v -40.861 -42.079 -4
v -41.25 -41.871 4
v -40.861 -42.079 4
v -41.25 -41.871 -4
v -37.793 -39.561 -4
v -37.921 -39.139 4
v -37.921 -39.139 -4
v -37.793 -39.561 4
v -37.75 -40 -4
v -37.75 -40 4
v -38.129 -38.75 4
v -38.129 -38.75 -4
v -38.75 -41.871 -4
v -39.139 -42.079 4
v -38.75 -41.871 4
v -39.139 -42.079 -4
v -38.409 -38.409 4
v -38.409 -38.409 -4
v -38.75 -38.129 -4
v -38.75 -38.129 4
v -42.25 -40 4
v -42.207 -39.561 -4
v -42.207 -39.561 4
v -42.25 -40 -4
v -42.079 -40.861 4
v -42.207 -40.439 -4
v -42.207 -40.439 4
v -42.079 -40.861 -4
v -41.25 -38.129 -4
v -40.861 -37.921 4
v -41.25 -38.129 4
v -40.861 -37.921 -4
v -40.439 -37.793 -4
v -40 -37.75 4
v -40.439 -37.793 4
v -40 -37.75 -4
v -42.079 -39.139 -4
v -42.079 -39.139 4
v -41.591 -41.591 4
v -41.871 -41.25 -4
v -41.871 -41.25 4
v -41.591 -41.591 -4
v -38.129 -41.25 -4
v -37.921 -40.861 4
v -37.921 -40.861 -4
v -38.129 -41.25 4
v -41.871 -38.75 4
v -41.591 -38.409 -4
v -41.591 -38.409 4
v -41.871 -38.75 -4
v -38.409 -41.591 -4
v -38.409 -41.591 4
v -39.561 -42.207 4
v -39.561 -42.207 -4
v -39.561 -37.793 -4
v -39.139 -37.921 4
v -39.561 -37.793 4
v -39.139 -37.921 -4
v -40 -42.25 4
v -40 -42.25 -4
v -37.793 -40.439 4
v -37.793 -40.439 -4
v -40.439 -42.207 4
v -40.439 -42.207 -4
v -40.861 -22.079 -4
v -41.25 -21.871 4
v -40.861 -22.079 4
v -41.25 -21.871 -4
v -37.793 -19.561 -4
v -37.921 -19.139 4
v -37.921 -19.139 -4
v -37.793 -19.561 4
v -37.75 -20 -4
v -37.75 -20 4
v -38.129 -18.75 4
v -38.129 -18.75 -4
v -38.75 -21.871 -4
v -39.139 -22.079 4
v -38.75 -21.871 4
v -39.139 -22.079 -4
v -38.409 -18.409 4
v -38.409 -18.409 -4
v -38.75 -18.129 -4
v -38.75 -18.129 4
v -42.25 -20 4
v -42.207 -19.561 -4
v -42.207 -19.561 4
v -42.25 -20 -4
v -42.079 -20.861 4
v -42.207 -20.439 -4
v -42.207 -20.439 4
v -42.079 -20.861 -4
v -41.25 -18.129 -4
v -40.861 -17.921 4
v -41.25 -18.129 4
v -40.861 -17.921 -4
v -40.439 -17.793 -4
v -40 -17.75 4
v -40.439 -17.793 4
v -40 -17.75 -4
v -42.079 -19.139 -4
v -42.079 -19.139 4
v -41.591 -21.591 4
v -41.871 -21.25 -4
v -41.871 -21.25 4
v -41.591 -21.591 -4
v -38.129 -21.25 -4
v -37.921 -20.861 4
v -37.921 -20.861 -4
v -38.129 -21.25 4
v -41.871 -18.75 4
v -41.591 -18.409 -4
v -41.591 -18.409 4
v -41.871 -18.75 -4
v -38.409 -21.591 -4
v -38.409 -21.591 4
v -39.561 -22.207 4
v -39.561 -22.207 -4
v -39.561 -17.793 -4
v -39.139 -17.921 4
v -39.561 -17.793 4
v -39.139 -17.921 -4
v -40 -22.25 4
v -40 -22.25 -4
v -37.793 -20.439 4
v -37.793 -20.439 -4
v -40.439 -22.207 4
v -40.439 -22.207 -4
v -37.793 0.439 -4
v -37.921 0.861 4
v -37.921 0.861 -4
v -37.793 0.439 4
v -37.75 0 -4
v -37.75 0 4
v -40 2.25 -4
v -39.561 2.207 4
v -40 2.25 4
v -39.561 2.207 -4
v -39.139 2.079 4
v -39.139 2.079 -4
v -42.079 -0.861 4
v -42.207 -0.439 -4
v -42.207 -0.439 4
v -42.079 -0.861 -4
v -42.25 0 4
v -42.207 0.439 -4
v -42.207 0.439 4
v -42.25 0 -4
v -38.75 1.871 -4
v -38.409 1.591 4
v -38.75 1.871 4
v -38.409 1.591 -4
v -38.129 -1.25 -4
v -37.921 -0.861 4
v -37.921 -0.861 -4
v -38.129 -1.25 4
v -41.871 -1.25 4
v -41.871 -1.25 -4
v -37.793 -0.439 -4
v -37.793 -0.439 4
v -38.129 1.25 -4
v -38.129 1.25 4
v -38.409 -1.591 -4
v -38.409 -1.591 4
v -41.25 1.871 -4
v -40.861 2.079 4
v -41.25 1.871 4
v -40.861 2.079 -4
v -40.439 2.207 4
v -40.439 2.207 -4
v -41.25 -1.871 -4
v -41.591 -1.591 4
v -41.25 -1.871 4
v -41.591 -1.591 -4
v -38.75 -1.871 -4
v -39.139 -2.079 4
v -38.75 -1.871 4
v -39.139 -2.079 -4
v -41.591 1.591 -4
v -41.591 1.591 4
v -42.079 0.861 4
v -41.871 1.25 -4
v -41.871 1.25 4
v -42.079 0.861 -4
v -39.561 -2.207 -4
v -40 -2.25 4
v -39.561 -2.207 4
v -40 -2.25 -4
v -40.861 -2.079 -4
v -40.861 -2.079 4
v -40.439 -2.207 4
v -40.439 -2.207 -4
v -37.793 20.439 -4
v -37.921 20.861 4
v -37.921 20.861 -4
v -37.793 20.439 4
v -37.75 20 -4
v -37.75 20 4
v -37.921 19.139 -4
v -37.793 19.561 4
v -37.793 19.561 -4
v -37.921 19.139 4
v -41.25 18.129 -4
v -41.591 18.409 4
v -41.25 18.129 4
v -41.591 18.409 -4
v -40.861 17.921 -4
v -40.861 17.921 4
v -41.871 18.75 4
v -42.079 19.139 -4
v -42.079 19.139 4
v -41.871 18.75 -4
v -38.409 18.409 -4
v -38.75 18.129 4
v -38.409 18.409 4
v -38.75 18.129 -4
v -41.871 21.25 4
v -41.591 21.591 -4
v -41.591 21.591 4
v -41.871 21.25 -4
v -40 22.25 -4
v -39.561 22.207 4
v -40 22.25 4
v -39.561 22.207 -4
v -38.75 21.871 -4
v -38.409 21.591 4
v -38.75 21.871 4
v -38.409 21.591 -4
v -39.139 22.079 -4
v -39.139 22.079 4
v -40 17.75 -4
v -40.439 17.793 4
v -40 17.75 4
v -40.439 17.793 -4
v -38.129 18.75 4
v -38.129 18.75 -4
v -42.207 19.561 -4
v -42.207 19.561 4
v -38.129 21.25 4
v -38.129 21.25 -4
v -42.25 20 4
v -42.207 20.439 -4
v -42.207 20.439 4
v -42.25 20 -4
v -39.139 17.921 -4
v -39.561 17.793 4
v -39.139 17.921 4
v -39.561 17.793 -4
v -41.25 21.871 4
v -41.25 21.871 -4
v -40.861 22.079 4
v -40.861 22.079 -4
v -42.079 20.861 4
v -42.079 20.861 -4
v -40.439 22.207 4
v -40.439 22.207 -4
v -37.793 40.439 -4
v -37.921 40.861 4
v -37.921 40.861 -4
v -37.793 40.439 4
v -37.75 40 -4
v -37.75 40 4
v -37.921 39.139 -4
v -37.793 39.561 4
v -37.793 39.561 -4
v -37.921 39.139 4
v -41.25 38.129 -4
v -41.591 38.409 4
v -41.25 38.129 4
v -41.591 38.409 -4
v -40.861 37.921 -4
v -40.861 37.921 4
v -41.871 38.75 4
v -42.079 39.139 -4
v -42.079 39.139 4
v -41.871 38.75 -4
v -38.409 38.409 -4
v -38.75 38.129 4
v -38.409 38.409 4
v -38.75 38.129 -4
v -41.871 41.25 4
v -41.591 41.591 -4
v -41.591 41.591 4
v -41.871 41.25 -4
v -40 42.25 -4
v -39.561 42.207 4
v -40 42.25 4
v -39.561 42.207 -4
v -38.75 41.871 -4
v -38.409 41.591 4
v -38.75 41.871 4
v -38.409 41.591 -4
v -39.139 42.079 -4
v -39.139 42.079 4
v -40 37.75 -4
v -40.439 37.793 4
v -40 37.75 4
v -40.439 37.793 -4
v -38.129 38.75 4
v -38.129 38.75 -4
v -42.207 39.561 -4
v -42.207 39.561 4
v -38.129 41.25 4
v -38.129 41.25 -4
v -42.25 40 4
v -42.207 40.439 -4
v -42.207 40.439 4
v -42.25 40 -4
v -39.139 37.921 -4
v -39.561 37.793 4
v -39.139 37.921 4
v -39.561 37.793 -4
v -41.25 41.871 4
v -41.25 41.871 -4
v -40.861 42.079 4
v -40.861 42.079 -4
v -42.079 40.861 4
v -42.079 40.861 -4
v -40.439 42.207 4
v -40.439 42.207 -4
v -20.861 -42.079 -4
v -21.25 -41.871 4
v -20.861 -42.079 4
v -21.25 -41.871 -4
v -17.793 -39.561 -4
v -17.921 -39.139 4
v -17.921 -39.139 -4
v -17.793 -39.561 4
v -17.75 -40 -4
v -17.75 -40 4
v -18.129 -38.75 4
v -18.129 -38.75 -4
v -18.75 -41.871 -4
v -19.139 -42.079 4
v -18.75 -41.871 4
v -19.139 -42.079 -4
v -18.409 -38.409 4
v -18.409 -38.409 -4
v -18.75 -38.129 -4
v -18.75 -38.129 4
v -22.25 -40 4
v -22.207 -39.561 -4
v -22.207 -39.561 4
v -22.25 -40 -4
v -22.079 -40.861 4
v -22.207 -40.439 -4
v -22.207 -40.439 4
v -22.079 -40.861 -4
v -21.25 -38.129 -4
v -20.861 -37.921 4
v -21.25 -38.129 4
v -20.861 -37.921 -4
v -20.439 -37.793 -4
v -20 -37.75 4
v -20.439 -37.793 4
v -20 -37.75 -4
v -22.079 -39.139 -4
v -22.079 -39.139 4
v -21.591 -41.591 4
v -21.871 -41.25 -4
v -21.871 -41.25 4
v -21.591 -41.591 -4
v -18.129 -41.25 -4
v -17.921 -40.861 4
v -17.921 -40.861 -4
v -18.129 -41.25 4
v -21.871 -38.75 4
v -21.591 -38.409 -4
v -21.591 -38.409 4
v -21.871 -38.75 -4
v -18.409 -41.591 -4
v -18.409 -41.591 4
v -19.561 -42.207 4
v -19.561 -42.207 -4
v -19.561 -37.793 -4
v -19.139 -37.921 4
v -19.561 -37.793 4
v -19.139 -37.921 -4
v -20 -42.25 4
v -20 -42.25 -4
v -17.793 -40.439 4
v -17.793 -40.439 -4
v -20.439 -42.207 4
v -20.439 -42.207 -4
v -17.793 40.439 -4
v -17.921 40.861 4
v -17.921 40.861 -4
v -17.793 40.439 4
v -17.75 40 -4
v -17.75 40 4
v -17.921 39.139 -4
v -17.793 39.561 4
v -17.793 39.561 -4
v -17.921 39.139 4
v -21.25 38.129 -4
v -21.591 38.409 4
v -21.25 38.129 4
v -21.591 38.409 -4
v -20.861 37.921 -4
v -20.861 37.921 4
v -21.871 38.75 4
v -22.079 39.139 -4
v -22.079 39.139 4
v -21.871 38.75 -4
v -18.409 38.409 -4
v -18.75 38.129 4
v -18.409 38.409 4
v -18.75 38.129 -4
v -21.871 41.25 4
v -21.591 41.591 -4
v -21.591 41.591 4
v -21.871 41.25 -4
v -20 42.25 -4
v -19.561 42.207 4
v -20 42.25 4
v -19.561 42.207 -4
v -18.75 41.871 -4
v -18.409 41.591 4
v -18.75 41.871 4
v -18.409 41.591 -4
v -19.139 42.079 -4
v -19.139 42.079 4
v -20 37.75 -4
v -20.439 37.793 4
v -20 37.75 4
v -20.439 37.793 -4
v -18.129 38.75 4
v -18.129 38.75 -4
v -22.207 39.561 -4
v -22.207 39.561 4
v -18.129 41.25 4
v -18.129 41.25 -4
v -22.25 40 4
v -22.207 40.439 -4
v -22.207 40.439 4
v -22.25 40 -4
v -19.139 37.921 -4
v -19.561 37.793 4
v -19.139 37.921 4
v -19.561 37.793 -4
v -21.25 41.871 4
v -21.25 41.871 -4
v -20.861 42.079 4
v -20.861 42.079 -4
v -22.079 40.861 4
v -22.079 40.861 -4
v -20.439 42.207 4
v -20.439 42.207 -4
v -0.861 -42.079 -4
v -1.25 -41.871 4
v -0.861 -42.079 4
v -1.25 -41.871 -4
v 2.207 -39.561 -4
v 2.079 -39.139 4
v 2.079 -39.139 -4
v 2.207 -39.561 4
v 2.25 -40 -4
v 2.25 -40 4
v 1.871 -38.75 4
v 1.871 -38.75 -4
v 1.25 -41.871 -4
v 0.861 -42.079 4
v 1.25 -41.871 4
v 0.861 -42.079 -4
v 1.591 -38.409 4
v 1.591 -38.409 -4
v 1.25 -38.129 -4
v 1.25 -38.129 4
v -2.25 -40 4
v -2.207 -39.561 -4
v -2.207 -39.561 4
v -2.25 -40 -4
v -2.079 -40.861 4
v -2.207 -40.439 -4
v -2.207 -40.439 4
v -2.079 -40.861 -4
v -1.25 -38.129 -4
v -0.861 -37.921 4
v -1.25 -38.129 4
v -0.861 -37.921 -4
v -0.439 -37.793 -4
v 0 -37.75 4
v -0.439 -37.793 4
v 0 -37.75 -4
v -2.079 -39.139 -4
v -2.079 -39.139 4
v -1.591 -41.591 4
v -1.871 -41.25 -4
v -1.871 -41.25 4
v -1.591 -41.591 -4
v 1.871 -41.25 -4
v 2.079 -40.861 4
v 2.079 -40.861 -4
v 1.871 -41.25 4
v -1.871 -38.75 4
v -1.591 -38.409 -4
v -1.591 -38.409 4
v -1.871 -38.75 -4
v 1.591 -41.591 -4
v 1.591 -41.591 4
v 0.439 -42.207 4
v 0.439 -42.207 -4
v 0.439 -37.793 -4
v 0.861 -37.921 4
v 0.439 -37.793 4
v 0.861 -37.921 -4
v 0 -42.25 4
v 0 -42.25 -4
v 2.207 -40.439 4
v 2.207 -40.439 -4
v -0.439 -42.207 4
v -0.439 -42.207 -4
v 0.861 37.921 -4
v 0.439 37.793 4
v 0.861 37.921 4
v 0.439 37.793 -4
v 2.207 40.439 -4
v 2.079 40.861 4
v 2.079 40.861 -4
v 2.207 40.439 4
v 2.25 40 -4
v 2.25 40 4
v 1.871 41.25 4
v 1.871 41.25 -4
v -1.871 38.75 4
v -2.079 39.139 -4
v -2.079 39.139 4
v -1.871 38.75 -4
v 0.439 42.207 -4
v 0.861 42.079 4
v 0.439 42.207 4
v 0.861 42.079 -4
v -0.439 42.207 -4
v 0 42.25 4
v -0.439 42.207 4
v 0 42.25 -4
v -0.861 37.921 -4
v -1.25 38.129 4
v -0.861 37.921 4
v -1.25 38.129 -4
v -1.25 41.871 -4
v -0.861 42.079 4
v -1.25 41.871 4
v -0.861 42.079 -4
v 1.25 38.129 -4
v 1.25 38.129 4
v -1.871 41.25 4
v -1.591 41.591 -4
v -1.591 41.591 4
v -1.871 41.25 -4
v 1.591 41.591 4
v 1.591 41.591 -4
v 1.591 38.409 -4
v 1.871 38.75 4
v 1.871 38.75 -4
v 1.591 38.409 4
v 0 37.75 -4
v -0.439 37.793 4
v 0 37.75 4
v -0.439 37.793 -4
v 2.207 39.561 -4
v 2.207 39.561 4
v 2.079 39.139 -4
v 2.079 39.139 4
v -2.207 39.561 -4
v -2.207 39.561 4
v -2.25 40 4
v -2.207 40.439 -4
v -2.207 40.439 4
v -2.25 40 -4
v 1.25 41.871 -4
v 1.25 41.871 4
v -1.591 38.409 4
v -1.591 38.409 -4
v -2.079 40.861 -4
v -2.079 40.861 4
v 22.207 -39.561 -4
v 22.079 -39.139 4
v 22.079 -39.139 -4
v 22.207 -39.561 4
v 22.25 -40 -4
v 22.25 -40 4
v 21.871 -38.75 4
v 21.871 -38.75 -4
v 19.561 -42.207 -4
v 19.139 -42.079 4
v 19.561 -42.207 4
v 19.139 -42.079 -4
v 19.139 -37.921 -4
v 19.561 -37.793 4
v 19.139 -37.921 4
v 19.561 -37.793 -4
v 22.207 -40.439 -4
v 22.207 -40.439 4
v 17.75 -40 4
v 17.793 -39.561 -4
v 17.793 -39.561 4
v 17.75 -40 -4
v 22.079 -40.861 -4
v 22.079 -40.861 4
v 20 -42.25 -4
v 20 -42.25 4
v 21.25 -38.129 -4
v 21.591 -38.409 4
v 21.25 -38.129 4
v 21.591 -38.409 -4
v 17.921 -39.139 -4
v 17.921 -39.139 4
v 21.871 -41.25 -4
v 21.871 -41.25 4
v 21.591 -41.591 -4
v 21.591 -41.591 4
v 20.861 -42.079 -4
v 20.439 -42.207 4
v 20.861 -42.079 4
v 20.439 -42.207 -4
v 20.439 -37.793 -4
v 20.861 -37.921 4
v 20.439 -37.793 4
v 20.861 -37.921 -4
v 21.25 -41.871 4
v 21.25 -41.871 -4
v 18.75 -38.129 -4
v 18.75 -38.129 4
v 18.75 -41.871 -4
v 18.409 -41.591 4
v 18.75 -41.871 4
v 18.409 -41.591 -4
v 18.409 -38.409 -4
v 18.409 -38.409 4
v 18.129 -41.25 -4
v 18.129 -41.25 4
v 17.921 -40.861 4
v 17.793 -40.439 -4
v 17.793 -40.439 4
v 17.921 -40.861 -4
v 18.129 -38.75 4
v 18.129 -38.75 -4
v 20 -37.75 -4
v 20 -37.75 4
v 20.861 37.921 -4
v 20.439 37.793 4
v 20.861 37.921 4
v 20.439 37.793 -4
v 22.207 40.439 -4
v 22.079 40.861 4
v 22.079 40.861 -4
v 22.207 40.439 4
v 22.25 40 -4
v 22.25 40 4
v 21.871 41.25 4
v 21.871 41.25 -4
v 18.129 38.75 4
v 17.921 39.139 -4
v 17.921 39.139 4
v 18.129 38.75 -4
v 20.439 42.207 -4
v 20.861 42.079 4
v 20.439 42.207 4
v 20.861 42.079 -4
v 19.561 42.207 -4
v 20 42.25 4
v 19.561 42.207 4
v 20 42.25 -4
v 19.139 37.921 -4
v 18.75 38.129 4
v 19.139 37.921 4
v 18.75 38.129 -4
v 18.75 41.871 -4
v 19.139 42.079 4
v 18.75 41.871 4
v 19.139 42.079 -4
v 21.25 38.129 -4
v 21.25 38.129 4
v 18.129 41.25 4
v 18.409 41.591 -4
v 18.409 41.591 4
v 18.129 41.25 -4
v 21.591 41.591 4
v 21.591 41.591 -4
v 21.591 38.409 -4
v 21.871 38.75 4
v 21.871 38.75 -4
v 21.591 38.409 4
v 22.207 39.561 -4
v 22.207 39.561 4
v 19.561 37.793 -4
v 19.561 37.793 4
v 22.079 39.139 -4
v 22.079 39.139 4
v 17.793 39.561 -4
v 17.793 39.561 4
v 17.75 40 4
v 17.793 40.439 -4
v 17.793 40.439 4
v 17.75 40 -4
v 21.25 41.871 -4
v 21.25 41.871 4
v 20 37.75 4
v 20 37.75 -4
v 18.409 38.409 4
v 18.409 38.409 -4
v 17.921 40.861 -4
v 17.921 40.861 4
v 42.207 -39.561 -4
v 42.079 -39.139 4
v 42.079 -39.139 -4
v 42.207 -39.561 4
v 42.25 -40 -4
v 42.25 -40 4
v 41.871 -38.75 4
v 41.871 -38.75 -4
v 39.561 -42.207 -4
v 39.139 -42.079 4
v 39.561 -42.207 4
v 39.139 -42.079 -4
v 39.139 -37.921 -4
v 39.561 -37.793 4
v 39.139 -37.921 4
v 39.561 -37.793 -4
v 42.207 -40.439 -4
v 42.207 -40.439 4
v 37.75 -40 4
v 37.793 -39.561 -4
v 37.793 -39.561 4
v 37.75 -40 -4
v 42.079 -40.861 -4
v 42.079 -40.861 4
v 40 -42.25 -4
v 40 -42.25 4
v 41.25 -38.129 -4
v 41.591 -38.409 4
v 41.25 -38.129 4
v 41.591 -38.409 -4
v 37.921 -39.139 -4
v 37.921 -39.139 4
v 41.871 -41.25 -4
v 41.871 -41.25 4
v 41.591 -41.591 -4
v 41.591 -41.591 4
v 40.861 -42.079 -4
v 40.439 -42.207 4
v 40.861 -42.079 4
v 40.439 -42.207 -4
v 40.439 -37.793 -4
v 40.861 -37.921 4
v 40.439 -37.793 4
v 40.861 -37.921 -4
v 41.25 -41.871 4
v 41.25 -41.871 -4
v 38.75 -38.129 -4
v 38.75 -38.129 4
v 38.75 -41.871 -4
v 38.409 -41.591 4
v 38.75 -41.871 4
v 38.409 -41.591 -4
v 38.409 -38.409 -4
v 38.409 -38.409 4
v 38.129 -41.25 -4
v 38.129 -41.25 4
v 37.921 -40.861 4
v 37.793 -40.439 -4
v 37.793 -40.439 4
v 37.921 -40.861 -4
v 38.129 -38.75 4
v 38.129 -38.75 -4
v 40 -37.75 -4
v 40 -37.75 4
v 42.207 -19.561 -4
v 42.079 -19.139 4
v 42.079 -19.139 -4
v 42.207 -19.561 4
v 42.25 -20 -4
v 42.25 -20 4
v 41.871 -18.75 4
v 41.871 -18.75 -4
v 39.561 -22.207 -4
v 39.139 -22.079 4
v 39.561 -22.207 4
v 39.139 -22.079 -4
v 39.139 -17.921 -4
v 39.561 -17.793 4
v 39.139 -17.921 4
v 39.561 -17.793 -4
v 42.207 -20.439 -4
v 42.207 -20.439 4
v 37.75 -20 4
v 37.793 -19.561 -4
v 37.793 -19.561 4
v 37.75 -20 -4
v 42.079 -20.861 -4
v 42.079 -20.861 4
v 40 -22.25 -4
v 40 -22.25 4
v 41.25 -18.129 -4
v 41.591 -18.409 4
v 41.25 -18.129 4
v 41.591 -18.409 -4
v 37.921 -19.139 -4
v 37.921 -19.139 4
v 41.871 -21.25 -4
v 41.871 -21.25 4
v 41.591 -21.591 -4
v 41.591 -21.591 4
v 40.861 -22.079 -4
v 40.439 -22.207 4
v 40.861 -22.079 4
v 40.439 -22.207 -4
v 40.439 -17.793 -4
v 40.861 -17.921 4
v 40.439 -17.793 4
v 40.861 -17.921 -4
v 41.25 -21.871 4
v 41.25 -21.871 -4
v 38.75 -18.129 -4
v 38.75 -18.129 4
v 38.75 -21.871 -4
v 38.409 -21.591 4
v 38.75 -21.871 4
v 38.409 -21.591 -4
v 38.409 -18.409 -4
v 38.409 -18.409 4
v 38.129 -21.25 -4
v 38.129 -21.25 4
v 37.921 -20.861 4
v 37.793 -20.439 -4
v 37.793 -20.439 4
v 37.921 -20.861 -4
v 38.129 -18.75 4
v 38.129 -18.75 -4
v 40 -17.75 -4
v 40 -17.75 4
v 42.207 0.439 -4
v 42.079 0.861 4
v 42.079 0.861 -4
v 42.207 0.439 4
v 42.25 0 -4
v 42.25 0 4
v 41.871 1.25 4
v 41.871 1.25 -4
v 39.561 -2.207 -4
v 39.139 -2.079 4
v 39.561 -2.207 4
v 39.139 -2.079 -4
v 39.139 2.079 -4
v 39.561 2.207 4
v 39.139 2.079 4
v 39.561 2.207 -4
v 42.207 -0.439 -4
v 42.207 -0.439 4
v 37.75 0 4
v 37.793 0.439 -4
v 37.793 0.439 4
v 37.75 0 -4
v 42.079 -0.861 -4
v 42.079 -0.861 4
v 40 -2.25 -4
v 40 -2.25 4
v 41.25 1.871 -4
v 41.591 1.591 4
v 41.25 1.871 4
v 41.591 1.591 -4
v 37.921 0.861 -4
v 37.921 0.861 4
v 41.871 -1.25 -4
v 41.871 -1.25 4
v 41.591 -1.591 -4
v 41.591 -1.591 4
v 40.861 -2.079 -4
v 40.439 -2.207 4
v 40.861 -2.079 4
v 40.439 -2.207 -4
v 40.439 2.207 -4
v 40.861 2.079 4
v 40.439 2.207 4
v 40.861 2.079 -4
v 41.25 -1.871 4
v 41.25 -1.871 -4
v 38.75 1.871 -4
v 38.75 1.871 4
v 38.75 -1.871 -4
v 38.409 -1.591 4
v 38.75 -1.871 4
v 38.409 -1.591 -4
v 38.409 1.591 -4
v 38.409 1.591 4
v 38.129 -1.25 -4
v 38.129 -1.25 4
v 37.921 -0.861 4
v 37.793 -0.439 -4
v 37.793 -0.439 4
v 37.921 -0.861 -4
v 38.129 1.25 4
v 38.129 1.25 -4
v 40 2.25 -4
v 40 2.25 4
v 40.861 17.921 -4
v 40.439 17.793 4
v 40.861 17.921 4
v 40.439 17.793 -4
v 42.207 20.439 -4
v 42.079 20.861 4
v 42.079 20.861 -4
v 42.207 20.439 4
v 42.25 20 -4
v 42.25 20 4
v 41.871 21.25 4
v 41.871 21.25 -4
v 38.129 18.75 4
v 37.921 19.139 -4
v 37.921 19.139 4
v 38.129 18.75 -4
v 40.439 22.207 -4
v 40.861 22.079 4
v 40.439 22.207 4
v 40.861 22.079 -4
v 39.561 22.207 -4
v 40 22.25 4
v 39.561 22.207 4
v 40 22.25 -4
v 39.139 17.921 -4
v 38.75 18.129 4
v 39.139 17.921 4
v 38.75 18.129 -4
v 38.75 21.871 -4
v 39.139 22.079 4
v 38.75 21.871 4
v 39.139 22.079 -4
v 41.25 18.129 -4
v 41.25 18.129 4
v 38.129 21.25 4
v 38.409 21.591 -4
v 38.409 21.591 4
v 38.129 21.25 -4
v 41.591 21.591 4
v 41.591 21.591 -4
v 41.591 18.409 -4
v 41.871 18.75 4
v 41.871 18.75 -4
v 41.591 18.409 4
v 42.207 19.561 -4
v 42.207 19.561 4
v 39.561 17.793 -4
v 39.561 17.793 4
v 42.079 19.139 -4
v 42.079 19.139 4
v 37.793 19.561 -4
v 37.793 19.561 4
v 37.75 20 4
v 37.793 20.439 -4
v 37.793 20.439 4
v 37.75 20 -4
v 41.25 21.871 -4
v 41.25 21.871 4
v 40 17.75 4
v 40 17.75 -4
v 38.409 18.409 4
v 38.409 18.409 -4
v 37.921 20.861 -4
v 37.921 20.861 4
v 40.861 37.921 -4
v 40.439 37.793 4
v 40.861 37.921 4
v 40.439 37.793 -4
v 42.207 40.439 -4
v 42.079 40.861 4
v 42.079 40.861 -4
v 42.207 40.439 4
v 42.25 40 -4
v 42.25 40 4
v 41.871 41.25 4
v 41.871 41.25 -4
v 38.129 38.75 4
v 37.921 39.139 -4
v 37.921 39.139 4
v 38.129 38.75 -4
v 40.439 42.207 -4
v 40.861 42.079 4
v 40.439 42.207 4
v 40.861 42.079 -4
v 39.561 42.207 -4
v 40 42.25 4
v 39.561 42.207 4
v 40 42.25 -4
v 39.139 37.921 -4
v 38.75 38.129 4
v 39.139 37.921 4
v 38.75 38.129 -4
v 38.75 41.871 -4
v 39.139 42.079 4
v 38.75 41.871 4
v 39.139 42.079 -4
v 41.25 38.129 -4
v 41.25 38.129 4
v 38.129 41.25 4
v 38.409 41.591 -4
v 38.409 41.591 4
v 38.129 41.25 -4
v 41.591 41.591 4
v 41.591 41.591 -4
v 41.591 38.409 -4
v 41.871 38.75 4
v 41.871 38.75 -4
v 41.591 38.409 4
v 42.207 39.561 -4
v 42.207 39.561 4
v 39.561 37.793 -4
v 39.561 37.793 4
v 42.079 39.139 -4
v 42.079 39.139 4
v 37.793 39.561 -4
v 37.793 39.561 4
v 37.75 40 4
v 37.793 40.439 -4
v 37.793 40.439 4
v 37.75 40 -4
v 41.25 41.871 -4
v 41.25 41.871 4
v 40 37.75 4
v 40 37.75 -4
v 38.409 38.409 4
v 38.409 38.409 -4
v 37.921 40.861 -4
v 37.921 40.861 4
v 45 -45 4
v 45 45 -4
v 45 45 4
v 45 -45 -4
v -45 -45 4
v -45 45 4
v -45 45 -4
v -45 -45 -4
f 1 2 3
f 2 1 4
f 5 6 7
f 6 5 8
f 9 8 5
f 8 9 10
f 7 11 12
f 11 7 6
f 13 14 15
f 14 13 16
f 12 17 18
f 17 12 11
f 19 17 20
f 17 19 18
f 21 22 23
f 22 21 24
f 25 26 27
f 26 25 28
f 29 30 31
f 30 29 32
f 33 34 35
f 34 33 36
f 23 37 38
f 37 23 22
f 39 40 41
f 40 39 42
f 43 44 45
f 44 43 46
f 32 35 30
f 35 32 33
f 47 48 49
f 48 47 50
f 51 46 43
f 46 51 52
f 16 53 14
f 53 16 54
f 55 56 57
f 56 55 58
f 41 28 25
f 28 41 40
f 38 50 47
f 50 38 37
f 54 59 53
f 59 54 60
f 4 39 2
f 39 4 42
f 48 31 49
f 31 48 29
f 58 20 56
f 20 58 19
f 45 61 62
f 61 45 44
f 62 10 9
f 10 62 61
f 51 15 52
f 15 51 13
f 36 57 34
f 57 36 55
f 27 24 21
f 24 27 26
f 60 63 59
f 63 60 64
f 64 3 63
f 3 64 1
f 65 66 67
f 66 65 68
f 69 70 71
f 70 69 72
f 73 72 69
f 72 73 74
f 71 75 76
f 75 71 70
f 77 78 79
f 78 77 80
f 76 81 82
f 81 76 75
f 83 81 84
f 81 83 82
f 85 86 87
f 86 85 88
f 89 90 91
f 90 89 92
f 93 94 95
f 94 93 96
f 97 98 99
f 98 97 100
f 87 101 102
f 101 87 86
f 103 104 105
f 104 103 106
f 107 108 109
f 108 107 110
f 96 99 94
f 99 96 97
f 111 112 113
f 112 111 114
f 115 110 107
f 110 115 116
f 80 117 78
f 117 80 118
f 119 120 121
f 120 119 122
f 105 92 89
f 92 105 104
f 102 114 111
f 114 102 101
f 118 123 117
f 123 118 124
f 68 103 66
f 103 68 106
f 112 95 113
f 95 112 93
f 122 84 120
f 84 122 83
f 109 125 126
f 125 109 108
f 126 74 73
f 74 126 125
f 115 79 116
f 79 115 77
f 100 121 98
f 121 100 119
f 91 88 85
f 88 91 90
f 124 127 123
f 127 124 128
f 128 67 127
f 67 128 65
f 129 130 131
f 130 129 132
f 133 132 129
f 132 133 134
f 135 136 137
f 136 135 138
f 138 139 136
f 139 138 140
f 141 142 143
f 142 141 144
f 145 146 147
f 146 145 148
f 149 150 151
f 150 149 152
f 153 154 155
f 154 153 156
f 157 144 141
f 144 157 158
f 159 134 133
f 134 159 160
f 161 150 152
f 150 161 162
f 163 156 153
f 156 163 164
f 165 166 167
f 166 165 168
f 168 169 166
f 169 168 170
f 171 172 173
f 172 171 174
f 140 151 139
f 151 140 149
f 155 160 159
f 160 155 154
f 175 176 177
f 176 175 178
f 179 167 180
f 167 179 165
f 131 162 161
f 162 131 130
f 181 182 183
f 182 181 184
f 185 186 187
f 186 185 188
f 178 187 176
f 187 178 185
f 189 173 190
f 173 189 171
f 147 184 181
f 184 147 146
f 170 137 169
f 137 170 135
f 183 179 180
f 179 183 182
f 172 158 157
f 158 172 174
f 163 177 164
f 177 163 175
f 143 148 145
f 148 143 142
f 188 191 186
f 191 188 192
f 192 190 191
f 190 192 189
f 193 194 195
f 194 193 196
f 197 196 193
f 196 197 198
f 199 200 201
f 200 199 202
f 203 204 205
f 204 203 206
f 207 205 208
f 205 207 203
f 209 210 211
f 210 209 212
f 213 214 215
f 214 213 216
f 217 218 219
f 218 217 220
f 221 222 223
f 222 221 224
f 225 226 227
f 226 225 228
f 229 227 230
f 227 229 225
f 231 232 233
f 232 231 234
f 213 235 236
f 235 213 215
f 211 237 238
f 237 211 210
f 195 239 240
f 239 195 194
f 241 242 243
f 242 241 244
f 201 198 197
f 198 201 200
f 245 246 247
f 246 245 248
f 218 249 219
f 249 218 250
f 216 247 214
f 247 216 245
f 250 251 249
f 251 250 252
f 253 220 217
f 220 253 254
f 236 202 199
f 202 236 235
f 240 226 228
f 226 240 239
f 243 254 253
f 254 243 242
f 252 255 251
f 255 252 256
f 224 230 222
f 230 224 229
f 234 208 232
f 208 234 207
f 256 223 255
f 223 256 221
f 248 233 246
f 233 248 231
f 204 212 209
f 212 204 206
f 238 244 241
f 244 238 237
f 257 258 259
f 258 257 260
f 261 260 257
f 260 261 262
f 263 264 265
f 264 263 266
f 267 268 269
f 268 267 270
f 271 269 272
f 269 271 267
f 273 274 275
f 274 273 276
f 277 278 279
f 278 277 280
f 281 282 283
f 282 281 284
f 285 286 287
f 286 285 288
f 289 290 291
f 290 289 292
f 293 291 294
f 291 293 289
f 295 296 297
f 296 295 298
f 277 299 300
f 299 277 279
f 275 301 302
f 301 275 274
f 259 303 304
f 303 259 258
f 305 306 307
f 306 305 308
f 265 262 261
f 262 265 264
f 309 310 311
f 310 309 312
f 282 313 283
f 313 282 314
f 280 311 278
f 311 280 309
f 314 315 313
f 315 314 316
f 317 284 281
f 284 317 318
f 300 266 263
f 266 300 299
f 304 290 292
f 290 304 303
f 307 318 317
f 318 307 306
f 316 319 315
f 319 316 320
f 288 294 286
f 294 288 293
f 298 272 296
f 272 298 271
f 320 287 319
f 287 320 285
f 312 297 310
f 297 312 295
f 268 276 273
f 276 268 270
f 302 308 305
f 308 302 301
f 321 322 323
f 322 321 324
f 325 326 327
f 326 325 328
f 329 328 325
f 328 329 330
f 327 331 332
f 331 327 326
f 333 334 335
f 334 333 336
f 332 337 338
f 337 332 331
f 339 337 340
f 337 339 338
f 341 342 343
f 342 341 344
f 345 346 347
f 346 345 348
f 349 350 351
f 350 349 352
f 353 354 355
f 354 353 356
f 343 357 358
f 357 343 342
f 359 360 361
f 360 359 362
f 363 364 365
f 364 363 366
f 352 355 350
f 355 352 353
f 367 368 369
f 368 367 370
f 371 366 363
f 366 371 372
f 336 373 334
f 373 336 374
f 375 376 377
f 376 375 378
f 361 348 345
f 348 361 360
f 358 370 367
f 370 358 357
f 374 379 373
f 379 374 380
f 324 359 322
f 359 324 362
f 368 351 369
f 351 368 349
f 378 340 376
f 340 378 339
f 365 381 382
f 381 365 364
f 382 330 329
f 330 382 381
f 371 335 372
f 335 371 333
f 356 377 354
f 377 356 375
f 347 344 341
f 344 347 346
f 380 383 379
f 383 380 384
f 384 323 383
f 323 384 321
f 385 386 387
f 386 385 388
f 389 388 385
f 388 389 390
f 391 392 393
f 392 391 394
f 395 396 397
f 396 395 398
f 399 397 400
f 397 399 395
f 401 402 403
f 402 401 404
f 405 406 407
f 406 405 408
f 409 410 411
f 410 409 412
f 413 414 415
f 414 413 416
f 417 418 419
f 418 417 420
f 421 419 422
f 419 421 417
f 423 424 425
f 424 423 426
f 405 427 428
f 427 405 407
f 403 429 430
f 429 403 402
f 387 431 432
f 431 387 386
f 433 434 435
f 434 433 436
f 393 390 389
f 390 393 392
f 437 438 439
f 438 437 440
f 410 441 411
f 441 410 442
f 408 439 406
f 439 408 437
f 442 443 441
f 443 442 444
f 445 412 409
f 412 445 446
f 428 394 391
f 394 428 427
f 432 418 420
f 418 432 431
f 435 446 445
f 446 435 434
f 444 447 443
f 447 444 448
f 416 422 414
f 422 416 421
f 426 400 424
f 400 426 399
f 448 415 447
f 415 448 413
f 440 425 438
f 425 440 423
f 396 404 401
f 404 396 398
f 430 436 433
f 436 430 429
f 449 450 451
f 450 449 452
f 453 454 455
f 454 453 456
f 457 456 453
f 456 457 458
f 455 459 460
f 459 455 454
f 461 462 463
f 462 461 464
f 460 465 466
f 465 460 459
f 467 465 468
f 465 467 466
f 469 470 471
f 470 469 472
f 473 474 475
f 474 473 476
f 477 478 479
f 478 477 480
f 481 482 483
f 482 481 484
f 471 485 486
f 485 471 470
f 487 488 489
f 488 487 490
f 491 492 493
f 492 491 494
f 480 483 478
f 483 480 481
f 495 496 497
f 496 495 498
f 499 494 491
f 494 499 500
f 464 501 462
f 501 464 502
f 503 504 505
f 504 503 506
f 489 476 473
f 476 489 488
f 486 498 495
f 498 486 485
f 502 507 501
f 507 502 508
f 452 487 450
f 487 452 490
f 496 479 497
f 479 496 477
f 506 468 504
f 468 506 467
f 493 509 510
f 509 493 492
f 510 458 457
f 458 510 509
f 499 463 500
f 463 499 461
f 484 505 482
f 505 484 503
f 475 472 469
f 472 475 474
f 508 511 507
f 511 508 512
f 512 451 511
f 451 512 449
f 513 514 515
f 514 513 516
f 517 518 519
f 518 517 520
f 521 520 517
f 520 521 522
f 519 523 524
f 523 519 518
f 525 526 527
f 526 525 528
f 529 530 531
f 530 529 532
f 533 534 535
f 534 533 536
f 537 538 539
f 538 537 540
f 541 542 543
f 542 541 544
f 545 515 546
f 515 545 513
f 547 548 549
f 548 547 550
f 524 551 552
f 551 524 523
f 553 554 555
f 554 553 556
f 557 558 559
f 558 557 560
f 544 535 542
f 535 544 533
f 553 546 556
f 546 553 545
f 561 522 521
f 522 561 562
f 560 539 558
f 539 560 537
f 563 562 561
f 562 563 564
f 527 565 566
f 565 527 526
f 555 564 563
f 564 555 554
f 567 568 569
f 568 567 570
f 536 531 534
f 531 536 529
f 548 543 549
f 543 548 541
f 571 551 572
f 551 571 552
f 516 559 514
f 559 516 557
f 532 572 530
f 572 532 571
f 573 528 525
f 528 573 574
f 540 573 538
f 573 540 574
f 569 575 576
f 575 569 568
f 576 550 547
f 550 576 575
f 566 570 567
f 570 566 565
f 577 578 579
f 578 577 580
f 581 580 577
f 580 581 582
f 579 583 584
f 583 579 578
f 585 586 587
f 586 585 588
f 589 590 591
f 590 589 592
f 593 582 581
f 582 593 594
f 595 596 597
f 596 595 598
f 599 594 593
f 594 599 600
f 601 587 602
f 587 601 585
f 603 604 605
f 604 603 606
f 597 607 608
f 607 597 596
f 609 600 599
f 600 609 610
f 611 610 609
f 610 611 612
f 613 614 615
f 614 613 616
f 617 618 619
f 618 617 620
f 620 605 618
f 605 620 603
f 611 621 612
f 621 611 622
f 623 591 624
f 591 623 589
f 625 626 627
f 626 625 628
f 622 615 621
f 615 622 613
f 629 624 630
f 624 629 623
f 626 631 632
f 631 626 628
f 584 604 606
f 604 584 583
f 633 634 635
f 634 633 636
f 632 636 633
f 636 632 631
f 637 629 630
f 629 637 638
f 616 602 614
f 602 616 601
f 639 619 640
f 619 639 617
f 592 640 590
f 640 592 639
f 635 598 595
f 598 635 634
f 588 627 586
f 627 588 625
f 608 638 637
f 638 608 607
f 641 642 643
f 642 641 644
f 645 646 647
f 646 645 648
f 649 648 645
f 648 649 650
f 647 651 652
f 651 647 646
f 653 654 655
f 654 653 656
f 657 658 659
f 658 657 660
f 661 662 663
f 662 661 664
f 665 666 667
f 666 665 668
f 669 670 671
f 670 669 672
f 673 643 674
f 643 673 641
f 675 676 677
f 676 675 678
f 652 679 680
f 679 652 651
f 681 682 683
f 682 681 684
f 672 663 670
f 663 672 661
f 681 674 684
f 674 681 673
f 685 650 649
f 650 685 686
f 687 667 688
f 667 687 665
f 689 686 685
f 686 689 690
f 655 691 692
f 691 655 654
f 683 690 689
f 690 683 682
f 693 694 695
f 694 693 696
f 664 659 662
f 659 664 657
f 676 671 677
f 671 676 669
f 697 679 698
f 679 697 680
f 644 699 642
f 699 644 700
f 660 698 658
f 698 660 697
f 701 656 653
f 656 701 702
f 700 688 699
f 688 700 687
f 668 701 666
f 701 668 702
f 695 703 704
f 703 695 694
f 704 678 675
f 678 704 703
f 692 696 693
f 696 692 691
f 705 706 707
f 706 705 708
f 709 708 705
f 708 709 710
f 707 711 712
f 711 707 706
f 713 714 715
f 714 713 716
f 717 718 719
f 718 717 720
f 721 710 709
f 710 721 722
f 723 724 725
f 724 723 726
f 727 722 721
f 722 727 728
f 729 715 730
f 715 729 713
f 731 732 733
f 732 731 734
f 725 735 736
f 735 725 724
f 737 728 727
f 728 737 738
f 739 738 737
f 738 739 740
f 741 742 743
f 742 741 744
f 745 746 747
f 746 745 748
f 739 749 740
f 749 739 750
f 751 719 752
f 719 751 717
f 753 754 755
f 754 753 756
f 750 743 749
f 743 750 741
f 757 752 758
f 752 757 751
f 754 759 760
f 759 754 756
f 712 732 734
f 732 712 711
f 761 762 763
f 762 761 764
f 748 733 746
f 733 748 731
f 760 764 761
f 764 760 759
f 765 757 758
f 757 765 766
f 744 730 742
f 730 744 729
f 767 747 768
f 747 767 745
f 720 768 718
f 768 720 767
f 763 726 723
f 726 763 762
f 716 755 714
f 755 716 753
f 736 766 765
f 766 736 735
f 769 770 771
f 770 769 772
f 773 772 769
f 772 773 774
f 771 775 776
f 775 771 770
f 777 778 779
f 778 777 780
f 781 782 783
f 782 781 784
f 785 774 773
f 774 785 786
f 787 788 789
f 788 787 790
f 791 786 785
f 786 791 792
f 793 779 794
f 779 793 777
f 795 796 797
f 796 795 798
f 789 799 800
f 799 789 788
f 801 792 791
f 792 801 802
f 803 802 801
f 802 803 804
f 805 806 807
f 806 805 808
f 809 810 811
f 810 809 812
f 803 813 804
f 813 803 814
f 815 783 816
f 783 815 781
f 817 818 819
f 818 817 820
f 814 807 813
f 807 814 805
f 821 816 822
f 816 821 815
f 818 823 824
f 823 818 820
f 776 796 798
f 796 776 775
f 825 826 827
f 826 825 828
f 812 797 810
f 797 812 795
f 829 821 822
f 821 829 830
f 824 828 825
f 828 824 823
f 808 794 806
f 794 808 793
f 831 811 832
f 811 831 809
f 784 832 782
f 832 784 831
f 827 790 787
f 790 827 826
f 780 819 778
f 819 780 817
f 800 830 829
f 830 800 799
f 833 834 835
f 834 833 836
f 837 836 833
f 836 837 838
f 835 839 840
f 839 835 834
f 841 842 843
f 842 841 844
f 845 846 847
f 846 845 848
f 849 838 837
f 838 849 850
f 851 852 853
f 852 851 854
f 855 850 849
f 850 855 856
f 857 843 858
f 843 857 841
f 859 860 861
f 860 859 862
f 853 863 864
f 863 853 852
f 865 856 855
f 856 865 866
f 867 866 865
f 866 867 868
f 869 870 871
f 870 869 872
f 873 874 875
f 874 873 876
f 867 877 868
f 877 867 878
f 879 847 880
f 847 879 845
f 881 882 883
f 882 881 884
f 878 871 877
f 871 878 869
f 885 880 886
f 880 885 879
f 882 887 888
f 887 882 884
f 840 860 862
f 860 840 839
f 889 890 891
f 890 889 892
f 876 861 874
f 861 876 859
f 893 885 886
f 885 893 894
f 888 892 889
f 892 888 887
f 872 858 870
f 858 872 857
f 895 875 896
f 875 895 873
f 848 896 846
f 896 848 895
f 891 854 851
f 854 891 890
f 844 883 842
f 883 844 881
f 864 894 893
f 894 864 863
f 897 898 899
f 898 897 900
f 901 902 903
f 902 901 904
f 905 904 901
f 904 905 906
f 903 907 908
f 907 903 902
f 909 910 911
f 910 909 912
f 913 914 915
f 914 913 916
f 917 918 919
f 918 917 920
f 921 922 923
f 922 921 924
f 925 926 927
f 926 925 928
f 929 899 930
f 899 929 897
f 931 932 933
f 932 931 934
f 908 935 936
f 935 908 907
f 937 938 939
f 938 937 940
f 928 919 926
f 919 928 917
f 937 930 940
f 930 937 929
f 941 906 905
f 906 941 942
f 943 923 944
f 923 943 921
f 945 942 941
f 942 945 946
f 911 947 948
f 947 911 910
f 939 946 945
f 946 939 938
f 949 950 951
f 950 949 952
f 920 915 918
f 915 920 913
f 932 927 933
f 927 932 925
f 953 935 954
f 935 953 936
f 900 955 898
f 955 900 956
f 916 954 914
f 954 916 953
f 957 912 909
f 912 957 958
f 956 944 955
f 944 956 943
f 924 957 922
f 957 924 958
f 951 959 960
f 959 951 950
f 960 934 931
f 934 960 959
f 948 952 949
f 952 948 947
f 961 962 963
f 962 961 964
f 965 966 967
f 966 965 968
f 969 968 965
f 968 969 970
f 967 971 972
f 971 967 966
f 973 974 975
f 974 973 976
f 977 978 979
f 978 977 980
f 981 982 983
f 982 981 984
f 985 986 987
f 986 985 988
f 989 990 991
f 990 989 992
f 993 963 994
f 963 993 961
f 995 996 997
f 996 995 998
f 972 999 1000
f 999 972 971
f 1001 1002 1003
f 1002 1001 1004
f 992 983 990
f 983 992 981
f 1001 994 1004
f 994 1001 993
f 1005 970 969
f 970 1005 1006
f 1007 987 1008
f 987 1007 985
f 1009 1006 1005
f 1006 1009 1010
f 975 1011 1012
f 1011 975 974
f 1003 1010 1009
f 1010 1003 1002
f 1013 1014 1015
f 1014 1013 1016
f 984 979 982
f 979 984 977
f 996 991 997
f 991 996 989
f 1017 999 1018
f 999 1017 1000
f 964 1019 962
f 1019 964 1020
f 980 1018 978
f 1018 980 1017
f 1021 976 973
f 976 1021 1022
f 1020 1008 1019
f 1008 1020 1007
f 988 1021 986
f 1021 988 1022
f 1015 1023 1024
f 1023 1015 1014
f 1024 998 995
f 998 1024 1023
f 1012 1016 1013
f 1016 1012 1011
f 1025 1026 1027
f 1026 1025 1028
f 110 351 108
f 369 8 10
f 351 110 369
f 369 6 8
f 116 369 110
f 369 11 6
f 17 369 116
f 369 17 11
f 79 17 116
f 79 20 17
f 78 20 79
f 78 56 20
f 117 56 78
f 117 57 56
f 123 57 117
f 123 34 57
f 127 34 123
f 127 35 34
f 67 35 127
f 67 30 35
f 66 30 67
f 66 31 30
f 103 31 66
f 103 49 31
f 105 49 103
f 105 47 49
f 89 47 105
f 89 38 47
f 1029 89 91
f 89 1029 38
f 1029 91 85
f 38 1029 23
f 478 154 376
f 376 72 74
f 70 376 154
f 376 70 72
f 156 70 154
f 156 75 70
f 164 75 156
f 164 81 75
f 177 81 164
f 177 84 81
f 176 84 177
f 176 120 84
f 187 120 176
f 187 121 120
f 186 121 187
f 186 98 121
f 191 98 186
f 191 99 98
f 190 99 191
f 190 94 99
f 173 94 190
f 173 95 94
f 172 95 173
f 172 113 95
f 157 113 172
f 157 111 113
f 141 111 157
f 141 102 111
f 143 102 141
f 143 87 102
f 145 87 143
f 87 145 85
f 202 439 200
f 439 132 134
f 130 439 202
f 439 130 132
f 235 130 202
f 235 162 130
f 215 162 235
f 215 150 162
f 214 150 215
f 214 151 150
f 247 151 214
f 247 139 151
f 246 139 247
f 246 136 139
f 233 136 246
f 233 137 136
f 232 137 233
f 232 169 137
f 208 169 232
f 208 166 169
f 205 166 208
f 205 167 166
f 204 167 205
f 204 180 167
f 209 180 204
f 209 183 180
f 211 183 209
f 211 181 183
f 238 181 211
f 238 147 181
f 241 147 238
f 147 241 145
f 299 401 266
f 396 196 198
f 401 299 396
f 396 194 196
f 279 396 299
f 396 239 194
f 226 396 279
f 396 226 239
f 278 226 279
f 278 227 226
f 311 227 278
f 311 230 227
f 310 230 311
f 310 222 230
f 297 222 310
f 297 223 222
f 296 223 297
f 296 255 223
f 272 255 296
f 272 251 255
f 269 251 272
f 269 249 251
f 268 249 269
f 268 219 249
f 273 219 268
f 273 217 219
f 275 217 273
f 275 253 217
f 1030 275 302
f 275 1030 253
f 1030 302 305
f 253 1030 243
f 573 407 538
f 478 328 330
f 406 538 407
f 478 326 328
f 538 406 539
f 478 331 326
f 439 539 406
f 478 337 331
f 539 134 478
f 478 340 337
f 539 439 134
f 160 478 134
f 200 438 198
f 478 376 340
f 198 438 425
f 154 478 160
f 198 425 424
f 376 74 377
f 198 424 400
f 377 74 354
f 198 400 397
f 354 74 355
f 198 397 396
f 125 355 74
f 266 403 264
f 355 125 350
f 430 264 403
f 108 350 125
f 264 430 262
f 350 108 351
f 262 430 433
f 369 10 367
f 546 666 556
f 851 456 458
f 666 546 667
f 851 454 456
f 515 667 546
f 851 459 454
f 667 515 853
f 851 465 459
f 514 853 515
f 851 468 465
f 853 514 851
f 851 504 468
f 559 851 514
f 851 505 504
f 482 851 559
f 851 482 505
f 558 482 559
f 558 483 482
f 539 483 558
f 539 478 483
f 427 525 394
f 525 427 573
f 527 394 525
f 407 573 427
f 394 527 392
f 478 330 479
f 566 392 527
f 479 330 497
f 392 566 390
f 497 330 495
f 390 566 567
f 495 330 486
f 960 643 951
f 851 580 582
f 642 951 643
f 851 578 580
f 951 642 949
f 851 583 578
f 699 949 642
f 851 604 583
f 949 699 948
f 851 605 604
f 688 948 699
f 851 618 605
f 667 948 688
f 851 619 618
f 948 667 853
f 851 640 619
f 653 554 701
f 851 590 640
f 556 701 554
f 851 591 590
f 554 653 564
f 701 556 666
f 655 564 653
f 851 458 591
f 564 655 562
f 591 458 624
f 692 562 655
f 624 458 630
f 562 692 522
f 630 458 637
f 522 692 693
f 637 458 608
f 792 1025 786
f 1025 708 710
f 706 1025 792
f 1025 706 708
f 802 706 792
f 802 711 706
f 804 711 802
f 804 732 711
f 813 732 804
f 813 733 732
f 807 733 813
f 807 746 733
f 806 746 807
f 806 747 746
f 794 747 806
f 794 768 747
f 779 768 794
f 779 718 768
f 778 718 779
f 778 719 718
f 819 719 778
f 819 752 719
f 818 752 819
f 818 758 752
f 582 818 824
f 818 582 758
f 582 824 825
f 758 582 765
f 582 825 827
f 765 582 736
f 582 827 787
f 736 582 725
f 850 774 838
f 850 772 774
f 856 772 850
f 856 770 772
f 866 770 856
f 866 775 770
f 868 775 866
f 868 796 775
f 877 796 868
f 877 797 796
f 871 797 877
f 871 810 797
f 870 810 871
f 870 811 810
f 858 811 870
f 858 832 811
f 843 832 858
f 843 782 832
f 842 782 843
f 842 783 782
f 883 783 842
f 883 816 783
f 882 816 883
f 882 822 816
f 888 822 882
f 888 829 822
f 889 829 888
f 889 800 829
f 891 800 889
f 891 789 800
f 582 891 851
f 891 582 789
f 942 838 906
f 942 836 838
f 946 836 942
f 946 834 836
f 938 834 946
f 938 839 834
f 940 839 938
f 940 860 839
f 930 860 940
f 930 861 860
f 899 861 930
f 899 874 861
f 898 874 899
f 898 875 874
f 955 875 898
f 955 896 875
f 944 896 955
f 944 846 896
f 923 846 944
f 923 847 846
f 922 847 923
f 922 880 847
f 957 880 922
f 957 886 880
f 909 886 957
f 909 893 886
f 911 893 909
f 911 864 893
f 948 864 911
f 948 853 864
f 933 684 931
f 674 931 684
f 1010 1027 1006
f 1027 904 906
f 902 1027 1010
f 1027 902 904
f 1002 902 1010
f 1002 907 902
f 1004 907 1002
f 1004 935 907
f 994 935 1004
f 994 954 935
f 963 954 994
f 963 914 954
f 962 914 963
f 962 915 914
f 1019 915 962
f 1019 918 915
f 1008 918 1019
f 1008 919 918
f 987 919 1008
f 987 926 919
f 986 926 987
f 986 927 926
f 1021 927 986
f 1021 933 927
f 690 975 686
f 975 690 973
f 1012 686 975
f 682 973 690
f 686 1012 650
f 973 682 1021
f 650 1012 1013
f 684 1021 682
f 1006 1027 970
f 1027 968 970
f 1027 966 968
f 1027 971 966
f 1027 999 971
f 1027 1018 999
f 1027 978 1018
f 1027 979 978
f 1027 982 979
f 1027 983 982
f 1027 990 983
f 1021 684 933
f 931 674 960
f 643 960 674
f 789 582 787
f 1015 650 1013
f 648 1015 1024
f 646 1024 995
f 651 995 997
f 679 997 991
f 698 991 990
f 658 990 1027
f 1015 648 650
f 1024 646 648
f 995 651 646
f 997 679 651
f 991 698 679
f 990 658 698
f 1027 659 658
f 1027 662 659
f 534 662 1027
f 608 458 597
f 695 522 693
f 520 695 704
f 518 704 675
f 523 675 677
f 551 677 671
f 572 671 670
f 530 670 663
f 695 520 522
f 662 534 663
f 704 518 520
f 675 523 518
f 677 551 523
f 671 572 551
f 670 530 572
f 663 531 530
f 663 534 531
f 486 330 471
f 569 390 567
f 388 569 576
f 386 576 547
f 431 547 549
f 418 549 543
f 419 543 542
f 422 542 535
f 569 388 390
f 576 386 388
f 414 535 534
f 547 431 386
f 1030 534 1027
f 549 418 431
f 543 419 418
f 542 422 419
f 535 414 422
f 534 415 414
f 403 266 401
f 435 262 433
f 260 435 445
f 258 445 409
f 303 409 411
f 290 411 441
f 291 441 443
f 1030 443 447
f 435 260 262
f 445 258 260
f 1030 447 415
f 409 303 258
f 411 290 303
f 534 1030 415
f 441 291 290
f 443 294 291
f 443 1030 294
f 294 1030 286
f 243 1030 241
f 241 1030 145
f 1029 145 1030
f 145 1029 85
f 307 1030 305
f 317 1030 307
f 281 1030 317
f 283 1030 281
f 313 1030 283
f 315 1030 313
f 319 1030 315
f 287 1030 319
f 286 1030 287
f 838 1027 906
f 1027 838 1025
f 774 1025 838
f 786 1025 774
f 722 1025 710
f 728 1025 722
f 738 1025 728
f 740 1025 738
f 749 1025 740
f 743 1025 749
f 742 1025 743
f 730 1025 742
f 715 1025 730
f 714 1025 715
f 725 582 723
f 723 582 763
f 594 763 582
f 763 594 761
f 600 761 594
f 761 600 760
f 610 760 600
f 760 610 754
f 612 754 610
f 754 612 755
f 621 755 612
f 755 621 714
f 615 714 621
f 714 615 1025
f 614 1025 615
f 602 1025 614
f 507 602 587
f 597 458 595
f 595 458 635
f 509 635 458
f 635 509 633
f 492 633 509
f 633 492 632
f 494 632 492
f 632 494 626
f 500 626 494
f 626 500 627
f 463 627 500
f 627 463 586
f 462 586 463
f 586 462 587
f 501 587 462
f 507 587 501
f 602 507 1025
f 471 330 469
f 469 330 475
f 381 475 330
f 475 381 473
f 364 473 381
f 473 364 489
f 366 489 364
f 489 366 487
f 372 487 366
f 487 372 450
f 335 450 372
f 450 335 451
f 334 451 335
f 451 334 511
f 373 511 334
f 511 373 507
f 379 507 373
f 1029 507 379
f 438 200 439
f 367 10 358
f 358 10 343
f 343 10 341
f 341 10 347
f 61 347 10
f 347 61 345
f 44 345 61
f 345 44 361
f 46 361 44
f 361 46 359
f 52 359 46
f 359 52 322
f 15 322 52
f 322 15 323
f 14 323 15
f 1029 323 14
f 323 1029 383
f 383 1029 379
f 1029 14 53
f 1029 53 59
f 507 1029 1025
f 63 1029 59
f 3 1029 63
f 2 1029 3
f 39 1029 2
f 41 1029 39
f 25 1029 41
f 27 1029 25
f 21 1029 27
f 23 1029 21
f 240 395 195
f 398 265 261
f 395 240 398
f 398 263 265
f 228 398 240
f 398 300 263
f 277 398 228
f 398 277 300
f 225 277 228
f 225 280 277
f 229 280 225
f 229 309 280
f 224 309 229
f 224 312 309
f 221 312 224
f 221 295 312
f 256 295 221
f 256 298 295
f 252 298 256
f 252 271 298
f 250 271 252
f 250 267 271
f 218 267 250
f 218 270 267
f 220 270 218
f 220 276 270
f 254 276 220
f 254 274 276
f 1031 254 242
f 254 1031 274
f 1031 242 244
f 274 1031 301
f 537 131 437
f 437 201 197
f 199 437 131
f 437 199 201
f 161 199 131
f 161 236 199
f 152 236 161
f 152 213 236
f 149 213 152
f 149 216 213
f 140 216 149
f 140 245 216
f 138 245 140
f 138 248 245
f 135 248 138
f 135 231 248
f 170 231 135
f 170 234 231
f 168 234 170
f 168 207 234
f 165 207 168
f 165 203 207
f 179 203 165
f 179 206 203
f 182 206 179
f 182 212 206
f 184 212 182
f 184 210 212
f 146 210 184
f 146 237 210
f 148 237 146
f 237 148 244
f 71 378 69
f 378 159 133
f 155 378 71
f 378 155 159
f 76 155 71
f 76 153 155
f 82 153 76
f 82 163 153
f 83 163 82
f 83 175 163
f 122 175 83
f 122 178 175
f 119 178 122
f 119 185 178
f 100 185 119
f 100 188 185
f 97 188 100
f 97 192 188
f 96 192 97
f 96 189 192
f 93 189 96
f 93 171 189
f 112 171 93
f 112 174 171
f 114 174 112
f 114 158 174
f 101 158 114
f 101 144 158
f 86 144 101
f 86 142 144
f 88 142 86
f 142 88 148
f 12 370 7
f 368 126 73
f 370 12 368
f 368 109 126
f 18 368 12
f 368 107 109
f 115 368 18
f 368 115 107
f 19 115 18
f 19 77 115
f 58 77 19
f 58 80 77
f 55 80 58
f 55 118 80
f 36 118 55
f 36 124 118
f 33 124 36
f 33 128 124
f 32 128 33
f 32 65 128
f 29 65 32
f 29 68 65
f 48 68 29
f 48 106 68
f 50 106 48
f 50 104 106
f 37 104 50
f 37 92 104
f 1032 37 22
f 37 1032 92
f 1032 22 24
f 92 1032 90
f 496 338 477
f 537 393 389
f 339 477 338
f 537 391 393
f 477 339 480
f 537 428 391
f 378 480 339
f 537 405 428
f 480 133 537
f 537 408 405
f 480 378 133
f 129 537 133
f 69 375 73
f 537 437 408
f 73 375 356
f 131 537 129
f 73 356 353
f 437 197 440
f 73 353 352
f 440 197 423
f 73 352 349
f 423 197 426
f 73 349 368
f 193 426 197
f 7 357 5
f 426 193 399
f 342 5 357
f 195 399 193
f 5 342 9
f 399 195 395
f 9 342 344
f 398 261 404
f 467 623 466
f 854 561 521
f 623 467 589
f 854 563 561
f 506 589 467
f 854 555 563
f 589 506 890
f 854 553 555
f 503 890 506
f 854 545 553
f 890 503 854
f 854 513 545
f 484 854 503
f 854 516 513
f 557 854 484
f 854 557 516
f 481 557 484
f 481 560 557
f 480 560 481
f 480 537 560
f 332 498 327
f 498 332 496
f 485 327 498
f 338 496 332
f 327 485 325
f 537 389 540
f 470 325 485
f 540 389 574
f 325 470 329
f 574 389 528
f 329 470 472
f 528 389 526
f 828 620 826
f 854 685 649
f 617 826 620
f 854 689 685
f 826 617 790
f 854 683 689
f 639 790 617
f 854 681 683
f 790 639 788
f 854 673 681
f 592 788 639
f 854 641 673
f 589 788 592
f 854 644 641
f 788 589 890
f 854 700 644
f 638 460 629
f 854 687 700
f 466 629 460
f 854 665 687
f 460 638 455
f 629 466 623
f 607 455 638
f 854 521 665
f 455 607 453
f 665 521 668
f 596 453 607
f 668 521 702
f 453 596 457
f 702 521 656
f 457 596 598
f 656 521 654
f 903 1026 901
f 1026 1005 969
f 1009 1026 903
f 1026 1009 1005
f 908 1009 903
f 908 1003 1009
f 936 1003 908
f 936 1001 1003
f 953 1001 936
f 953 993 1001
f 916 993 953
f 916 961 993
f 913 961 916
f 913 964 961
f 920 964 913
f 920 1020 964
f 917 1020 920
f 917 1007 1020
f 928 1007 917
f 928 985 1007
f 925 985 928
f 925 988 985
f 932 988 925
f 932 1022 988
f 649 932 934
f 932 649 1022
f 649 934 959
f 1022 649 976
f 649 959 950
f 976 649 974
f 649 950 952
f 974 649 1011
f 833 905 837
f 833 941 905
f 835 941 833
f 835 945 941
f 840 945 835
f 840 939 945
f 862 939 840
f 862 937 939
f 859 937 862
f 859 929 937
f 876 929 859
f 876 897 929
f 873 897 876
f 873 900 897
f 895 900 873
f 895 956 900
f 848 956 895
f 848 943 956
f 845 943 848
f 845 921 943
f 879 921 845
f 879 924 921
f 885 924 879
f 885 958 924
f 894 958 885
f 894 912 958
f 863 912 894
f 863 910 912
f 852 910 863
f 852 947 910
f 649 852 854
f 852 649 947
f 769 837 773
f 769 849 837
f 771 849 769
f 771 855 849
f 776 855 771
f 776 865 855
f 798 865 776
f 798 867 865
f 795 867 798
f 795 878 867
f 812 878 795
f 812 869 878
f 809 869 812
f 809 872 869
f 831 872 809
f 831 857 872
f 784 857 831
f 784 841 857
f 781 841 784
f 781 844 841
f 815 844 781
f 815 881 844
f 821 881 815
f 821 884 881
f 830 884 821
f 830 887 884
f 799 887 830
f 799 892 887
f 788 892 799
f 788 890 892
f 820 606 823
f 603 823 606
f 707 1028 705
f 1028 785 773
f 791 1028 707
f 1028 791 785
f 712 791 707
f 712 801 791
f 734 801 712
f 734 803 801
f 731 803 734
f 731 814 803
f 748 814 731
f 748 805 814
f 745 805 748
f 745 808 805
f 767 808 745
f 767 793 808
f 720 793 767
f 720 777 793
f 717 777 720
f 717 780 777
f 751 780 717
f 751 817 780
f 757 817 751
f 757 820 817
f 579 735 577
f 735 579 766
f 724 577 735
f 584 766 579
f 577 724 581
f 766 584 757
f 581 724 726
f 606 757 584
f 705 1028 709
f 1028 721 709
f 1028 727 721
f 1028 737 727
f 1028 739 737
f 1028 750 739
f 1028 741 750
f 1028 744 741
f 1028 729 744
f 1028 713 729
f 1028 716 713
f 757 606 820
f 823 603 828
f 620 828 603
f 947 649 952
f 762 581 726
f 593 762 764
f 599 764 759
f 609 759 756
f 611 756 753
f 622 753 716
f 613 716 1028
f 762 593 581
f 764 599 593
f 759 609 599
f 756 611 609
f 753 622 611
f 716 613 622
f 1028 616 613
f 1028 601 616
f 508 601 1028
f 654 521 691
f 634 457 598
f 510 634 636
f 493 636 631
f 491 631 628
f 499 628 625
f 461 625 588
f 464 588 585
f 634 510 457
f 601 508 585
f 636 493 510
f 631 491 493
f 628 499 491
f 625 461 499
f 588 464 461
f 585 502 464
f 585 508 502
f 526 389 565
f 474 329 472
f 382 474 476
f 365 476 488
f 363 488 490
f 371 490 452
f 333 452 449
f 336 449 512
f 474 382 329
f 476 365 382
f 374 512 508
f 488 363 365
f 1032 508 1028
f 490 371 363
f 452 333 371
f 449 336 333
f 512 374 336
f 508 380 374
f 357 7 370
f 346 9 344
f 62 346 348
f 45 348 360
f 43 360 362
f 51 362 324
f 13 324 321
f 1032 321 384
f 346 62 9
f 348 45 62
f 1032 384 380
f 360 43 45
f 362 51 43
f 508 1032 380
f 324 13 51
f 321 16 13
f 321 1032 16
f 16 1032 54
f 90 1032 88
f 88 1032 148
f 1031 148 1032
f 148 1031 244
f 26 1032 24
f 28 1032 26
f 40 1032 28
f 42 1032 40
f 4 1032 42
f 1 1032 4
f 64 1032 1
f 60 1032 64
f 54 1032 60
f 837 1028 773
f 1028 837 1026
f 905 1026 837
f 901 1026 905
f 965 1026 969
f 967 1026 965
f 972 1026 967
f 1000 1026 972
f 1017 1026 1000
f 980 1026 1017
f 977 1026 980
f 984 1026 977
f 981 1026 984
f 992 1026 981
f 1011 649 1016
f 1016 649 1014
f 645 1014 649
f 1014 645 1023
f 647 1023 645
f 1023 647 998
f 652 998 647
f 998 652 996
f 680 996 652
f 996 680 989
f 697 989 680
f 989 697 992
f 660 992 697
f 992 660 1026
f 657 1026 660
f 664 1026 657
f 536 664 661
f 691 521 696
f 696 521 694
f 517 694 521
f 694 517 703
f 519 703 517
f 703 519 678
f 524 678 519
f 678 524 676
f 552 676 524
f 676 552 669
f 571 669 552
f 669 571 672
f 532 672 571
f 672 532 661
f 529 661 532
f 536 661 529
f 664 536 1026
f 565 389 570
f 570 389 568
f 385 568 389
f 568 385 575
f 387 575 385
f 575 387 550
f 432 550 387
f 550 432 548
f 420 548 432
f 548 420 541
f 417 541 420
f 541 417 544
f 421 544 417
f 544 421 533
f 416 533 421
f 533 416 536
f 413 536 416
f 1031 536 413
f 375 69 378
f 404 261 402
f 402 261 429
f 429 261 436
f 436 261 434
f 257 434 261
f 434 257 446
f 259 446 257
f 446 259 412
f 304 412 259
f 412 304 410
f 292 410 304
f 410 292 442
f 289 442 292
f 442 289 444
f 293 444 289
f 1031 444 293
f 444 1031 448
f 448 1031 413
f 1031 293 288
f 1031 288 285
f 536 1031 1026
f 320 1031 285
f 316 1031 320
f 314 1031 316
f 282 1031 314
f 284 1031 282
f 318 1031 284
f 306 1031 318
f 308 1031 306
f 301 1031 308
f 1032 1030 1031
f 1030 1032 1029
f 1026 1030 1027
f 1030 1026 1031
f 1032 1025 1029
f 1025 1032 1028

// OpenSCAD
$fn = 32;

// ----------------------------------------------------------------------
// Perforated panel 90 x 90 x 8
// 5 x 5 Ø4.5 holes, frame layout
// ----------------------------------------------------------------------

// --- parameters (mm) ---
panel = [90, 90, 8];  // overall size (x, y, z)
hole_d = 4.5;         // hole diameter
pitch_x = 20;         // hole pitch along X
pitch_y = 20;         // hole pitch along Y

// --- derived feature positions (mm) ---
margin = hole_d / 2 + 2;            // = 4.25   clearance from the panel edge
cols = floor((panel[0] - 2 * margin) / pitch_x) + 1;  // = 5   how many columns fit in X
rows = floor((panel[1] - 2 * margin) / pitch_y) + 1;  // = 5   how many rows fit in Y
span_x = (cols - 1) * pitch_x + 0;  // = 80   width of the field
span_y = (rows - 1) * pitch_y;      // = 80   height of the field
origin_x = -span_x / 2;             // = -40   X of the first hole
origin_y = -span_y / 2;             // = -40   Y of the first row
holes = 2 * cols + 2 * (rows - 2);  // = 16   holes around the frame
feature_centers = [
  [origin_x + 0 * pitch_x, origin_y + 0 * pitch_y],
  [origin_x + 0 * pitch_x, origin_y + 1 * pitch_y],
  [origin_x + 0 * pitch_x, origin_y + 2 * pitch_y],
  [origin_x + 0 * pitch_x, origin_y + 3 * pitch_y],
  [origin_x + 0 * pitch_x, origin_y + 4 * pitch_y],
  [origin_x + 1 * pitch_x, origin_y + 0 * pitch_y],
  [origin_x + 1 * pitch_x, origin_y + 4 * pitch_y],
  [origin_x + 2 * pitch_x, origin_y + 0 * pitch_y],
  [origin_x + 2 * pitch_x, origin_y + 4 * pitch_y],
  [origin_x + 3 * pitch_x, origin_y + 0 * pitch_y],
  [origin_x + 3 * pitch_x, origin_y + 4 * pitch_y],
  [origin_x + 4 * pitch_x, origin_y + 0 * pitch_y],
  [origin_x + 4 * pitch_x, origin_y + 1 * pitch_y],
  [origin_x + 4 * pitch_x, origin_y + 2 * pitch_y],
  [origin_x + 4 * pitch_x, origin_y + 3 * pitch_y],
  [origin_x + 4 * pitch_x, origin_y + 4 * pitch_y]
];   // hole centres, used verbatim by the cutter loop

// panel outline, every hole through
difference() {
  cube(panel, center = true);
  for (centre = feature_centers)
    translate([centre[0], centre[1], 0])
      cylinder(d = hole_d, h = panel[2] + 2, center = true);
}
